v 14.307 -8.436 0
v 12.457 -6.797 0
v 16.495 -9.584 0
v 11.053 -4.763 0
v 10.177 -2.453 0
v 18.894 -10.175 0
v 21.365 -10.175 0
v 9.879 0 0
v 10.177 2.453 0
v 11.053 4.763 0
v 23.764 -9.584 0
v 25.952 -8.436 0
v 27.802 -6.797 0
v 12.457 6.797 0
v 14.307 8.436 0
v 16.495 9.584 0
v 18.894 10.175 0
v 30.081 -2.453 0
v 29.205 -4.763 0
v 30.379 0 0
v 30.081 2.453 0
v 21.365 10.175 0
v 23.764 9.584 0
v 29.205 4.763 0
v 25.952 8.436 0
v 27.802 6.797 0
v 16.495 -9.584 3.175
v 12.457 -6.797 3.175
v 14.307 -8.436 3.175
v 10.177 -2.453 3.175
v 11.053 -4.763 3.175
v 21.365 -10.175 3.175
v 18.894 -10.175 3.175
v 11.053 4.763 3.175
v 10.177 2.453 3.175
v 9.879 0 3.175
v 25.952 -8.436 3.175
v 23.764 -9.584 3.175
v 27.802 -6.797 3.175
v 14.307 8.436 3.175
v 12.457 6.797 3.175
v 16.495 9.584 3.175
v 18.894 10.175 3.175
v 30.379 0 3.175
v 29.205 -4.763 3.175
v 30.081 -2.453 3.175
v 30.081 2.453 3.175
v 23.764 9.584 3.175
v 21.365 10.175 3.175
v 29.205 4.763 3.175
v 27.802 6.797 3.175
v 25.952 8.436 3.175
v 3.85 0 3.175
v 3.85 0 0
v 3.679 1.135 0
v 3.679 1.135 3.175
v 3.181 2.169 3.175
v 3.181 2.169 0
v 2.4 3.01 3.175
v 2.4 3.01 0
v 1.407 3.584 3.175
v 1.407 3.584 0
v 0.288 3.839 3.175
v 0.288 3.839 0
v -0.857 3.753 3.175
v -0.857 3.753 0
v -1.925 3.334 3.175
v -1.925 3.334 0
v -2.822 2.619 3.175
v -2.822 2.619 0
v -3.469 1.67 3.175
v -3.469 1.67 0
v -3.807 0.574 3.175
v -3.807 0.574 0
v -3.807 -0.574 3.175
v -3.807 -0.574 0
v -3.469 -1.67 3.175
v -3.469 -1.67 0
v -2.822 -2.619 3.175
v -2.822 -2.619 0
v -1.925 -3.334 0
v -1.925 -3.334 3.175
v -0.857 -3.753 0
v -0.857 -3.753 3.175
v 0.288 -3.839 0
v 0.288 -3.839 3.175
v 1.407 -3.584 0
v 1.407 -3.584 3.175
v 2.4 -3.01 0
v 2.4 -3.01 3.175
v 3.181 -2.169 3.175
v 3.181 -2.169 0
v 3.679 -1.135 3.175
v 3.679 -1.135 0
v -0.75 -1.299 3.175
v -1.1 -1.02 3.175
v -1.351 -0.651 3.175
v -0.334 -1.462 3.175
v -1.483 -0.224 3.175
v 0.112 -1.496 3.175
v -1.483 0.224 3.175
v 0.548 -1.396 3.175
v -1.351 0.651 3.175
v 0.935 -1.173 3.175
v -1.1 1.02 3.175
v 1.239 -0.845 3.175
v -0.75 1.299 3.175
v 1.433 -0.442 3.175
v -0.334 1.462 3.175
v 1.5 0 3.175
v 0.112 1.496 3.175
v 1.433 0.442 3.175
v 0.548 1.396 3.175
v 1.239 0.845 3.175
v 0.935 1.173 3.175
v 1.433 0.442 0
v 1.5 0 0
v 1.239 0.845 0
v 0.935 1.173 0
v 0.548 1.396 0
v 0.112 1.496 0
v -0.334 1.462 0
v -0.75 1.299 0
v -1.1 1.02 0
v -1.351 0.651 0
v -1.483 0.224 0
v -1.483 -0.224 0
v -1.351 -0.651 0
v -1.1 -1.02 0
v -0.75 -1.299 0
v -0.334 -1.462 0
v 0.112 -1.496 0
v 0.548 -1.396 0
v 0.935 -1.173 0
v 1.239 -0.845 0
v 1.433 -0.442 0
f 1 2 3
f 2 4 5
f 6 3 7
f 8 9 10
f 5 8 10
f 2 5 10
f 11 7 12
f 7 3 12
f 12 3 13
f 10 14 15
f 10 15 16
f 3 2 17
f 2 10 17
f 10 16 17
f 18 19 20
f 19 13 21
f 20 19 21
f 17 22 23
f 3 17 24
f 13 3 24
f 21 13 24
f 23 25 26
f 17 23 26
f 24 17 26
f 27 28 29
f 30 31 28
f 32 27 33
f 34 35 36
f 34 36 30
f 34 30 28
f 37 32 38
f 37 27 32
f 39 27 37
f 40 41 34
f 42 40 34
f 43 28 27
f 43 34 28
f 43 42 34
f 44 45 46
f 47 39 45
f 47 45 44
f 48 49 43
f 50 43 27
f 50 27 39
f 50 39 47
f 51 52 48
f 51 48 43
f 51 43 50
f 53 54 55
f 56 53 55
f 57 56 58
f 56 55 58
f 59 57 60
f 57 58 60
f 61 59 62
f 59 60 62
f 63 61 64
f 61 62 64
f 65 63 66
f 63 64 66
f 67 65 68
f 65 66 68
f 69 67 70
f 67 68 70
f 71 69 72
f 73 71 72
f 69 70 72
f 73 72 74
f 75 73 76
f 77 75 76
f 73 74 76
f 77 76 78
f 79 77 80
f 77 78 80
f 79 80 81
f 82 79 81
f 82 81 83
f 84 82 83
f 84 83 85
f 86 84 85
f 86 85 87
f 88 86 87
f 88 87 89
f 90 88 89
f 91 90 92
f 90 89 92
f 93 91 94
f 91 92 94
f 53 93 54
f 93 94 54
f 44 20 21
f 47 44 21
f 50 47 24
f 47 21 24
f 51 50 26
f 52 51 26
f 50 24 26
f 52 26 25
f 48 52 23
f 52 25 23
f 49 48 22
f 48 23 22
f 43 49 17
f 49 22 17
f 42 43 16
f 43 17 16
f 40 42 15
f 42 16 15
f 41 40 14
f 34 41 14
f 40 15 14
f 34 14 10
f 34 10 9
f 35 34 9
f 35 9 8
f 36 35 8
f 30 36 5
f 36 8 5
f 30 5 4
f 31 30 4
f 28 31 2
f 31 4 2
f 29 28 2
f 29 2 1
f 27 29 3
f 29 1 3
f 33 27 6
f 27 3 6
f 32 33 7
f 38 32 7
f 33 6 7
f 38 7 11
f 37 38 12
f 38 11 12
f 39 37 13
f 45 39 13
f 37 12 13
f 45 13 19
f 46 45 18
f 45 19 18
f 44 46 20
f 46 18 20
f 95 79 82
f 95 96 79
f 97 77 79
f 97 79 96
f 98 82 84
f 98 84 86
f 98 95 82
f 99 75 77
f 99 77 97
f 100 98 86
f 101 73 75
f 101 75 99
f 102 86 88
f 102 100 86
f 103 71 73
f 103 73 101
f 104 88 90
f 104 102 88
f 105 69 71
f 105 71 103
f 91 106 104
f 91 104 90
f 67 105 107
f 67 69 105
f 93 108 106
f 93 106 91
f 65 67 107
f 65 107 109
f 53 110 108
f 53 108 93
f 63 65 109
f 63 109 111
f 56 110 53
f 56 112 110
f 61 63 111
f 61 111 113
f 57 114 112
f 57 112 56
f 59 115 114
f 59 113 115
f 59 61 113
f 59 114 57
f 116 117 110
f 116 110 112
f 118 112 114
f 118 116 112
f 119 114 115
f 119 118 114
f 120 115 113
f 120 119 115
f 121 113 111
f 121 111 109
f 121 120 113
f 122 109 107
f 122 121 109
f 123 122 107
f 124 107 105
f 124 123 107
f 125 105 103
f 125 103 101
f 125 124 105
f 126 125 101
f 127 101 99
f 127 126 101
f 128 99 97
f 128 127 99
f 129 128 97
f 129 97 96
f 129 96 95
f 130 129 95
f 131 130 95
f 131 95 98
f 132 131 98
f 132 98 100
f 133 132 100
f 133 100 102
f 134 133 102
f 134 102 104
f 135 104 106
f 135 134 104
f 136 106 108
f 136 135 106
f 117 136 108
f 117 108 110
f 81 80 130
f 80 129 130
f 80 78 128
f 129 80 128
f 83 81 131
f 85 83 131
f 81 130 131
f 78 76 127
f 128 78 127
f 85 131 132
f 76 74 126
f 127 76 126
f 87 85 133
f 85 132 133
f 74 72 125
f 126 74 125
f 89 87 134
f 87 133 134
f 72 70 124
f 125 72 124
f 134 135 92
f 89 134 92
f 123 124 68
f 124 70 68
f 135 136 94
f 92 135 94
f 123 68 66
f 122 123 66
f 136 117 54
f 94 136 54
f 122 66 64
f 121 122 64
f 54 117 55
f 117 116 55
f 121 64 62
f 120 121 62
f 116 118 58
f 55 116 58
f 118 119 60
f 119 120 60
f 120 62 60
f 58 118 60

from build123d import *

# Parameters (mm, degrees)
F0_R     = 3.85
F0_R_2   = 1.5
F1_DEPTH = 3.175
F0_R_3   = 10.25


# Not quite as in the source:
# - a length typed as a fraction of an inch, garbled in the dataset ("3 / 203.2 mm" for 3/8 in), is restored


with BuildPart() as f1:
    # F0 (on Top) → F1 (new body)
    with BuildSketch(Plane.XY):
        Circle(F0_R)
        Circle(F0_R_2, mode=Mode.SUBTRACT)
    extrude(amount=F1_DEPTH)


with BuildPart() as f1b:
    # F0 (on Top) → F1, piece 2 (new body)
    with BuildSketch(Plane.XY):
        with Locations((20.1293285936, 0)):
            Circle(F0_R_3)
    extrude(amount=F1_DEPTH)


solid = Compound([f1.part, f1b.part])
